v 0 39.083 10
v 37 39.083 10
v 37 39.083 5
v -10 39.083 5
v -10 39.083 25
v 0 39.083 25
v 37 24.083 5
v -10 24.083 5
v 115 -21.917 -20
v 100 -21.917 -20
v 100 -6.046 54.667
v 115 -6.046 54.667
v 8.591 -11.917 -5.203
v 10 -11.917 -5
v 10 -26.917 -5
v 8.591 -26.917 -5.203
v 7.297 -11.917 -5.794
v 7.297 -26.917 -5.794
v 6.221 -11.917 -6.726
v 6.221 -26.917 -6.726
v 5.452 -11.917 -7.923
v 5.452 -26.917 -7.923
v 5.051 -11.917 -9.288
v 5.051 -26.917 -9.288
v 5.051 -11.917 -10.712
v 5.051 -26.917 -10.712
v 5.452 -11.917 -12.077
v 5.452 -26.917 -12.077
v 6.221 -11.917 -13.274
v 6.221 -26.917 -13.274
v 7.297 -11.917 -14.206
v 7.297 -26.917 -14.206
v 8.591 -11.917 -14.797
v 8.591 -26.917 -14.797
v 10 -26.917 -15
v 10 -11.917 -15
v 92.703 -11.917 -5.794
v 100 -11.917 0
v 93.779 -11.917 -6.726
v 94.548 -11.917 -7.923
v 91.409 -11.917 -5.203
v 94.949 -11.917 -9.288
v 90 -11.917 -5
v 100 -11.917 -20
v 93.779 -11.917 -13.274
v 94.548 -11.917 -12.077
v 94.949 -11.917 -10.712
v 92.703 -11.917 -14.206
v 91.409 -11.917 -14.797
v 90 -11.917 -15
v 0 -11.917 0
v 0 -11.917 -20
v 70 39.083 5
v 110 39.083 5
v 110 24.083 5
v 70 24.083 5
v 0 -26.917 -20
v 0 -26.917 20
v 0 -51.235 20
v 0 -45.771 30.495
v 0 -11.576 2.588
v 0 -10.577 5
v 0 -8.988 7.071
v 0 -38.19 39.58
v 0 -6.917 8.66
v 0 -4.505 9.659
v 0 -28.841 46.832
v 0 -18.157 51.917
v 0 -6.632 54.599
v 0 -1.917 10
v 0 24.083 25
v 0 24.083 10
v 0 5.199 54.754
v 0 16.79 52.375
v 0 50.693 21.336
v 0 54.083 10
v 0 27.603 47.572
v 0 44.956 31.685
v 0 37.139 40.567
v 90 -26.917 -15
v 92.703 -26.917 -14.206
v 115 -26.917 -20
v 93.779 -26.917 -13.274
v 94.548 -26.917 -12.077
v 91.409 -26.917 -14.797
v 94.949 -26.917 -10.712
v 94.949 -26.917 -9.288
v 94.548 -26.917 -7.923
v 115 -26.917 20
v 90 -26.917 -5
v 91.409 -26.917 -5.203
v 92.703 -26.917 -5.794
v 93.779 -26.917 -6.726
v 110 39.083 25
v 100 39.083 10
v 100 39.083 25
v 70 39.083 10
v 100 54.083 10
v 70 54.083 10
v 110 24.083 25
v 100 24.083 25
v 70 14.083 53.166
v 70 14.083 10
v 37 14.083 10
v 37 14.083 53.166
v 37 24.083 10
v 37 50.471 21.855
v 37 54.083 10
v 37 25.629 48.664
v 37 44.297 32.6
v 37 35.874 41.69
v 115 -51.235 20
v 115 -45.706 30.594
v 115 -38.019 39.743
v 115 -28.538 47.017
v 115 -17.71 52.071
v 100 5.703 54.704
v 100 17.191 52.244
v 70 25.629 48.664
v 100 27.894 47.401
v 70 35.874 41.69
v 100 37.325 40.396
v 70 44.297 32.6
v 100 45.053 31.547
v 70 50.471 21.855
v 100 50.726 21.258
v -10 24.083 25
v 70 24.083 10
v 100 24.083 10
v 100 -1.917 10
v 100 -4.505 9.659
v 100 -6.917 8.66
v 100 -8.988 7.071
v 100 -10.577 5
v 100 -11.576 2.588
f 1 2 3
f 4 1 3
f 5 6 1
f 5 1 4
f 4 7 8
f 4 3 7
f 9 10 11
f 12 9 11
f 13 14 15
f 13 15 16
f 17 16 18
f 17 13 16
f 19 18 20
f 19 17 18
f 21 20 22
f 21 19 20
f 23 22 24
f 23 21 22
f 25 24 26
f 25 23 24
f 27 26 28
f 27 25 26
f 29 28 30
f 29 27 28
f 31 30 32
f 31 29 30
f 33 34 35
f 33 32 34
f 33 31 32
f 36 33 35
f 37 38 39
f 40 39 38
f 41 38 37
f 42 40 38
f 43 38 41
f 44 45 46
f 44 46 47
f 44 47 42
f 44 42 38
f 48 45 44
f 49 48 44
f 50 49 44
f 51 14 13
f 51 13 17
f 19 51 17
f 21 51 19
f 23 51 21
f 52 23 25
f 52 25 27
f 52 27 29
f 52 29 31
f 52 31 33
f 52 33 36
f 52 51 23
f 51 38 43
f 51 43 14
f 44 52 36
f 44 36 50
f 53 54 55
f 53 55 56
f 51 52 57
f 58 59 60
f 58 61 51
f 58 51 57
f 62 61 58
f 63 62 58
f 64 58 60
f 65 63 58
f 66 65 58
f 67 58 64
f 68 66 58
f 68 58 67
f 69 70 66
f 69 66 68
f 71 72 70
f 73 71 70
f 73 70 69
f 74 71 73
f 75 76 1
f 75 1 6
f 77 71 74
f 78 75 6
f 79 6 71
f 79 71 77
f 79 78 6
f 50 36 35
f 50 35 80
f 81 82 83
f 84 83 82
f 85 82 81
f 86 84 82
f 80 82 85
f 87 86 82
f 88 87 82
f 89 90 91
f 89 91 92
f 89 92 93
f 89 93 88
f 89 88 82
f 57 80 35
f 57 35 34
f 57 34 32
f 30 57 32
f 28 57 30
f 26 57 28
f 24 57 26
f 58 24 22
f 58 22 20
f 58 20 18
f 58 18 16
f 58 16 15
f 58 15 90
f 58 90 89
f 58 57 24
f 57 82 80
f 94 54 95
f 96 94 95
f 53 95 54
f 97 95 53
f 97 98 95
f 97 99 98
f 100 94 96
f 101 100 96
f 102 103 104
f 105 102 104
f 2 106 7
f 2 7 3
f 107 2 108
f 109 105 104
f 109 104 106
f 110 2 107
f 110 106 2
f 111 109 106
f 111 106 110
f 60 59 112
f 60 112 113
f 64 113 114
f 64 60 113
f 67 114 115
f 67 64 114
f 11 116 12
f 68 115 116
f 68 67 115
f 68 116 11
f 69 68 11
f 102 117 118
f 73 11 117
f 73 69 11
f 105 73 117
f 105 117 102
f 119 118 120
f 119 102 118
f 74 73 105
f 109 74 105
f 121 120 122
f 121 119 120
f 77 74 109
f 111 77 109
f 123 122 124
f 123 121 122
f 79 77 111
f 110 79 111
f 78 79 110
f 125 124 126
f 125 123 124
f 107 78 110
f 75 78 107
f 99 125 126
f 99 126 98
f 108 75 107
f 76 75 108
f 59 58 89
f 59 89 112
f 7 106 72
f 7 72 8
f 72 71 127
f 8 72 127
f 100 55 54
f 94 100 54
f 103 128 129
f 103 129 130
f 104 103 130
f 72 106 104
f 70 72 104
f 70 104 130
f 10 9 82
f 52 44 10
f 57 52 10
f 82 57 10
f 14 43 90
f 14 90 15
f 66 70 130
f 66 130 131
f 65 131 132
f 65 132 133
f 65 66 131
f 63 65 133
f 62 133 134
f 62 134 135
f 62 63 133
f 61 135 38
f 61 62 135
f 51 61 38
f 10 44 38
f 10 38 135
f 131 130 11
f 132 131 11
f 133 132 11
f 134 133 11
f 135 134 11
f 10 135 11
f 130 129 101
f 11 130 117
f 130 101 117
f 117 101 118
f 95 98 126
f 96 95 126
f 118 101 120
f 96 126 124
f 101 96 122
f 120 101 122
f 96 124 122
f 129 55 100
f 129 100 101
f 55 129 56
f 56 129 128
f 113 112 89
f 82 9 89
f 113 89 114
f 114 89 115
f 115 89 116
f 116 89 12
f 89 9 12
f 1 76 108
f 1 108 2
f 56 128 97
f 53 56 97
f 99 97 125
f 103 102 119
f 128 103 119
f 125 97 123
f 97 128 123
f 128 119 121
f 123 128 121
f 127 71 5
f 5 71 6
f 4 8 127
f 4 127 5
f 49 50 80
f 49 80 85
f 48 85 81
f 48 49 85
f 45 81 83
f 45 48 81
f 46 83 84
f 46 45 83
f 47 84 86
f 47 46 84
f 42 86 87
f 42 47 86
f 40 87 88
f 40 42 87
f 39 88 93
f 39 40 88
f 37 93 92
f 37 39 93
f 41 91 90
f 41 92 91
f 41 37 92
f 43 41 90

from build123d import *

# Parameters (mm, degrees)
BOSS_EXTRUDE1_DEPTH      = 115
CUT_EXTRUDE3_START       = -15
CUT_EXTRUDE3_DEPTH       = 15
CUT_EXTRUDE4_DEPTH       = 67
SKETCH5_W                = 33
SKETCH5_H                = 40
CUT_EXTRUDE5_DEPTH       = 67
SKETCH6_W                = 40
SKETCH6_H                = 15
BOSS_EXTRUDE2_DEPTH      = 5
SKETCH7_W                = 15
SKETCH7_H                = 15
BOSS_EXTRUDE4_DEPTH      = 10
SKETCH8_W                = 7
SKETCH8_H                = 15
BOSS_EXTRUDE5_DEPTH      = 5
BOSS_EXTRUDE6_DEPTH      = 5
BOSS_EXTRUDE6_DEPTH_BACK = 15
SKETCH9_W                = 40
SKETCH9_H                = 15


with BuildPart() as part:
    # Sketch1 → Boss-Extrude1 (new body)
    with BuildSketch(Plane(origin=(0, 0, 0), x_dir=(0, 0, -1), z_dir=(1, 0, 0))):
        with BuildLine():
            Line((-10, 54.083269132), (-10, -1.916730868))
            ThreePointArc((-10, -1.916730868), (-7.071067812, -8.98779868), (0, -11.916730868))
            Line((0, -11.916730868), (20, -11.916730868))
            Line((20, -11.916730868), (20, -26.916730868))
            Line((20, -26.916730868), (-20, -26.916730868))
            Line((-20, -26.916730868), (-20, -51.23475383))
            ThreePointArc((-20, -51.23475383), (-54.753734942, 5.198895061), (-10, 54.083269132))
        make_face()
    extrude(amount=BOSS_EXTRUDE1_DEPTH)

    # Sketch2 → Cut-Extrude3 (cut)
    with BuildSketch(Plane(origin=(115, 0, 0), x_dir=(0, 0, -1), z_dir=(1, 0, 0)).offset(CUT_EXTRUDE3_START)):
        with BuildLine():
            Line((20, -21.916730868), (-54.666698166, -6.045834235))
            ThreePointArc((-54.666698166, -6.045834235), (-45.878767393, 34.080884973), (-10, 54.083269132))
            Line((-10, 54.083269132), (-10, -1.916730868))
            ThreePointArc((-10, -1.916730868), (-7.071067812, -8.98779868), (0, -11.916730868))
            Line((0, -11.916730868), (20, -11.916730868))
            Line((20, -11.916730868), (20, -21.916730868))
        make_face()
    extrude(amount=CUT_EXTRUDE3_DEPTH, mode=Mode.SUBTRACT)

    # Sketch4 → Cut-Extrude4 (cut)
    with BuildSketch(Plane(origin=(0, -11.916730868, 0), x_dir=(1, 0, 0), z_dir=(0, 1, 0))):
        with BuildLine():
            Line((10, 15), (90, 15))
            ThreePointArc((90, 15), (95, 10), (90, 5))
            Line((90, 5), (10, 5))
            ThreePointArc((10, 5), (5, 10), (10, 15))
        make_face()
    extrude(amount=-CUT_EXTRUDE4_DEPTH, mode=Mode.SUBTRACT)

    # Sketch5 → Cut-Extrude5 (cut)
    with BuildSketch(Plane(origin=(0, 0, 10), x_dir=(-1, 0, 0), z_dir=(0, 0, -1))):
        with Locations((-53.5, 34.083269132)):
            Rectangle(SKETCH5_W, SKETCH5_H)
    extrude(amount=-CUT_EXTRUDE5_DEPTH, mode=Mode.SUBTRACT)

    # Sketch6 → Boss-Extrude2 (add)
    with BuildSketch(Plane(origin=(0, 0, 10), x_dir=(-1, 0, 0), z_dir=(0, 0, -1))):
        with Locations((-17, 31.583269132)):
            Rectangle(SKETCH6_W, SKETCH6_H)
    extrude(amount=BOSS_EXTRUDE2_DEPTH)

    # Sketch7 → Boss-Extrude4 (add)
    with BuildSketch(Plane.ZY):
        with Locations((17.5, 31.583269132)):
            Rectangle(SKETCH7_W, SKETCH7_H)
    extrude(amount=BOSS_EXTRUDE4_DEPTH)

    # Sketch8 → Boss-Extrude5 (add)
    with BuildSketch(Plane(origin=(0, 0, 10), x_dir=(-1, 0, 0), z_dir=(0, 0, -1))):
        with Locations((6.5, 31.583269132)):
            Rectangle(SKETCH8_W, SKETCH8_H)
    extrude(amount=BOSS_EXTRUDE5_DEPTH)

    # Sketch9 → Boss-Extrude6 (add, two sides: drawn at the far end of the back side and taken through both)
    with BuildSketch(Plane(origin=(0, 0, 10), x_dir=(-1, 0, 0), z_dir=(0, 0, -1)).offset(-BOSS_EXTRUDE6_DEPTH_BACK)):
        with Locations((-90, 31.583269132)):
            Rectangle(SKETCH9_W, SKETCH9_H)
    extrude(amount=BOSS_EXTRUDE6_DEPTH + BOSS_EXTRUDE6_DEPTH_BACK)


solid = part.part
